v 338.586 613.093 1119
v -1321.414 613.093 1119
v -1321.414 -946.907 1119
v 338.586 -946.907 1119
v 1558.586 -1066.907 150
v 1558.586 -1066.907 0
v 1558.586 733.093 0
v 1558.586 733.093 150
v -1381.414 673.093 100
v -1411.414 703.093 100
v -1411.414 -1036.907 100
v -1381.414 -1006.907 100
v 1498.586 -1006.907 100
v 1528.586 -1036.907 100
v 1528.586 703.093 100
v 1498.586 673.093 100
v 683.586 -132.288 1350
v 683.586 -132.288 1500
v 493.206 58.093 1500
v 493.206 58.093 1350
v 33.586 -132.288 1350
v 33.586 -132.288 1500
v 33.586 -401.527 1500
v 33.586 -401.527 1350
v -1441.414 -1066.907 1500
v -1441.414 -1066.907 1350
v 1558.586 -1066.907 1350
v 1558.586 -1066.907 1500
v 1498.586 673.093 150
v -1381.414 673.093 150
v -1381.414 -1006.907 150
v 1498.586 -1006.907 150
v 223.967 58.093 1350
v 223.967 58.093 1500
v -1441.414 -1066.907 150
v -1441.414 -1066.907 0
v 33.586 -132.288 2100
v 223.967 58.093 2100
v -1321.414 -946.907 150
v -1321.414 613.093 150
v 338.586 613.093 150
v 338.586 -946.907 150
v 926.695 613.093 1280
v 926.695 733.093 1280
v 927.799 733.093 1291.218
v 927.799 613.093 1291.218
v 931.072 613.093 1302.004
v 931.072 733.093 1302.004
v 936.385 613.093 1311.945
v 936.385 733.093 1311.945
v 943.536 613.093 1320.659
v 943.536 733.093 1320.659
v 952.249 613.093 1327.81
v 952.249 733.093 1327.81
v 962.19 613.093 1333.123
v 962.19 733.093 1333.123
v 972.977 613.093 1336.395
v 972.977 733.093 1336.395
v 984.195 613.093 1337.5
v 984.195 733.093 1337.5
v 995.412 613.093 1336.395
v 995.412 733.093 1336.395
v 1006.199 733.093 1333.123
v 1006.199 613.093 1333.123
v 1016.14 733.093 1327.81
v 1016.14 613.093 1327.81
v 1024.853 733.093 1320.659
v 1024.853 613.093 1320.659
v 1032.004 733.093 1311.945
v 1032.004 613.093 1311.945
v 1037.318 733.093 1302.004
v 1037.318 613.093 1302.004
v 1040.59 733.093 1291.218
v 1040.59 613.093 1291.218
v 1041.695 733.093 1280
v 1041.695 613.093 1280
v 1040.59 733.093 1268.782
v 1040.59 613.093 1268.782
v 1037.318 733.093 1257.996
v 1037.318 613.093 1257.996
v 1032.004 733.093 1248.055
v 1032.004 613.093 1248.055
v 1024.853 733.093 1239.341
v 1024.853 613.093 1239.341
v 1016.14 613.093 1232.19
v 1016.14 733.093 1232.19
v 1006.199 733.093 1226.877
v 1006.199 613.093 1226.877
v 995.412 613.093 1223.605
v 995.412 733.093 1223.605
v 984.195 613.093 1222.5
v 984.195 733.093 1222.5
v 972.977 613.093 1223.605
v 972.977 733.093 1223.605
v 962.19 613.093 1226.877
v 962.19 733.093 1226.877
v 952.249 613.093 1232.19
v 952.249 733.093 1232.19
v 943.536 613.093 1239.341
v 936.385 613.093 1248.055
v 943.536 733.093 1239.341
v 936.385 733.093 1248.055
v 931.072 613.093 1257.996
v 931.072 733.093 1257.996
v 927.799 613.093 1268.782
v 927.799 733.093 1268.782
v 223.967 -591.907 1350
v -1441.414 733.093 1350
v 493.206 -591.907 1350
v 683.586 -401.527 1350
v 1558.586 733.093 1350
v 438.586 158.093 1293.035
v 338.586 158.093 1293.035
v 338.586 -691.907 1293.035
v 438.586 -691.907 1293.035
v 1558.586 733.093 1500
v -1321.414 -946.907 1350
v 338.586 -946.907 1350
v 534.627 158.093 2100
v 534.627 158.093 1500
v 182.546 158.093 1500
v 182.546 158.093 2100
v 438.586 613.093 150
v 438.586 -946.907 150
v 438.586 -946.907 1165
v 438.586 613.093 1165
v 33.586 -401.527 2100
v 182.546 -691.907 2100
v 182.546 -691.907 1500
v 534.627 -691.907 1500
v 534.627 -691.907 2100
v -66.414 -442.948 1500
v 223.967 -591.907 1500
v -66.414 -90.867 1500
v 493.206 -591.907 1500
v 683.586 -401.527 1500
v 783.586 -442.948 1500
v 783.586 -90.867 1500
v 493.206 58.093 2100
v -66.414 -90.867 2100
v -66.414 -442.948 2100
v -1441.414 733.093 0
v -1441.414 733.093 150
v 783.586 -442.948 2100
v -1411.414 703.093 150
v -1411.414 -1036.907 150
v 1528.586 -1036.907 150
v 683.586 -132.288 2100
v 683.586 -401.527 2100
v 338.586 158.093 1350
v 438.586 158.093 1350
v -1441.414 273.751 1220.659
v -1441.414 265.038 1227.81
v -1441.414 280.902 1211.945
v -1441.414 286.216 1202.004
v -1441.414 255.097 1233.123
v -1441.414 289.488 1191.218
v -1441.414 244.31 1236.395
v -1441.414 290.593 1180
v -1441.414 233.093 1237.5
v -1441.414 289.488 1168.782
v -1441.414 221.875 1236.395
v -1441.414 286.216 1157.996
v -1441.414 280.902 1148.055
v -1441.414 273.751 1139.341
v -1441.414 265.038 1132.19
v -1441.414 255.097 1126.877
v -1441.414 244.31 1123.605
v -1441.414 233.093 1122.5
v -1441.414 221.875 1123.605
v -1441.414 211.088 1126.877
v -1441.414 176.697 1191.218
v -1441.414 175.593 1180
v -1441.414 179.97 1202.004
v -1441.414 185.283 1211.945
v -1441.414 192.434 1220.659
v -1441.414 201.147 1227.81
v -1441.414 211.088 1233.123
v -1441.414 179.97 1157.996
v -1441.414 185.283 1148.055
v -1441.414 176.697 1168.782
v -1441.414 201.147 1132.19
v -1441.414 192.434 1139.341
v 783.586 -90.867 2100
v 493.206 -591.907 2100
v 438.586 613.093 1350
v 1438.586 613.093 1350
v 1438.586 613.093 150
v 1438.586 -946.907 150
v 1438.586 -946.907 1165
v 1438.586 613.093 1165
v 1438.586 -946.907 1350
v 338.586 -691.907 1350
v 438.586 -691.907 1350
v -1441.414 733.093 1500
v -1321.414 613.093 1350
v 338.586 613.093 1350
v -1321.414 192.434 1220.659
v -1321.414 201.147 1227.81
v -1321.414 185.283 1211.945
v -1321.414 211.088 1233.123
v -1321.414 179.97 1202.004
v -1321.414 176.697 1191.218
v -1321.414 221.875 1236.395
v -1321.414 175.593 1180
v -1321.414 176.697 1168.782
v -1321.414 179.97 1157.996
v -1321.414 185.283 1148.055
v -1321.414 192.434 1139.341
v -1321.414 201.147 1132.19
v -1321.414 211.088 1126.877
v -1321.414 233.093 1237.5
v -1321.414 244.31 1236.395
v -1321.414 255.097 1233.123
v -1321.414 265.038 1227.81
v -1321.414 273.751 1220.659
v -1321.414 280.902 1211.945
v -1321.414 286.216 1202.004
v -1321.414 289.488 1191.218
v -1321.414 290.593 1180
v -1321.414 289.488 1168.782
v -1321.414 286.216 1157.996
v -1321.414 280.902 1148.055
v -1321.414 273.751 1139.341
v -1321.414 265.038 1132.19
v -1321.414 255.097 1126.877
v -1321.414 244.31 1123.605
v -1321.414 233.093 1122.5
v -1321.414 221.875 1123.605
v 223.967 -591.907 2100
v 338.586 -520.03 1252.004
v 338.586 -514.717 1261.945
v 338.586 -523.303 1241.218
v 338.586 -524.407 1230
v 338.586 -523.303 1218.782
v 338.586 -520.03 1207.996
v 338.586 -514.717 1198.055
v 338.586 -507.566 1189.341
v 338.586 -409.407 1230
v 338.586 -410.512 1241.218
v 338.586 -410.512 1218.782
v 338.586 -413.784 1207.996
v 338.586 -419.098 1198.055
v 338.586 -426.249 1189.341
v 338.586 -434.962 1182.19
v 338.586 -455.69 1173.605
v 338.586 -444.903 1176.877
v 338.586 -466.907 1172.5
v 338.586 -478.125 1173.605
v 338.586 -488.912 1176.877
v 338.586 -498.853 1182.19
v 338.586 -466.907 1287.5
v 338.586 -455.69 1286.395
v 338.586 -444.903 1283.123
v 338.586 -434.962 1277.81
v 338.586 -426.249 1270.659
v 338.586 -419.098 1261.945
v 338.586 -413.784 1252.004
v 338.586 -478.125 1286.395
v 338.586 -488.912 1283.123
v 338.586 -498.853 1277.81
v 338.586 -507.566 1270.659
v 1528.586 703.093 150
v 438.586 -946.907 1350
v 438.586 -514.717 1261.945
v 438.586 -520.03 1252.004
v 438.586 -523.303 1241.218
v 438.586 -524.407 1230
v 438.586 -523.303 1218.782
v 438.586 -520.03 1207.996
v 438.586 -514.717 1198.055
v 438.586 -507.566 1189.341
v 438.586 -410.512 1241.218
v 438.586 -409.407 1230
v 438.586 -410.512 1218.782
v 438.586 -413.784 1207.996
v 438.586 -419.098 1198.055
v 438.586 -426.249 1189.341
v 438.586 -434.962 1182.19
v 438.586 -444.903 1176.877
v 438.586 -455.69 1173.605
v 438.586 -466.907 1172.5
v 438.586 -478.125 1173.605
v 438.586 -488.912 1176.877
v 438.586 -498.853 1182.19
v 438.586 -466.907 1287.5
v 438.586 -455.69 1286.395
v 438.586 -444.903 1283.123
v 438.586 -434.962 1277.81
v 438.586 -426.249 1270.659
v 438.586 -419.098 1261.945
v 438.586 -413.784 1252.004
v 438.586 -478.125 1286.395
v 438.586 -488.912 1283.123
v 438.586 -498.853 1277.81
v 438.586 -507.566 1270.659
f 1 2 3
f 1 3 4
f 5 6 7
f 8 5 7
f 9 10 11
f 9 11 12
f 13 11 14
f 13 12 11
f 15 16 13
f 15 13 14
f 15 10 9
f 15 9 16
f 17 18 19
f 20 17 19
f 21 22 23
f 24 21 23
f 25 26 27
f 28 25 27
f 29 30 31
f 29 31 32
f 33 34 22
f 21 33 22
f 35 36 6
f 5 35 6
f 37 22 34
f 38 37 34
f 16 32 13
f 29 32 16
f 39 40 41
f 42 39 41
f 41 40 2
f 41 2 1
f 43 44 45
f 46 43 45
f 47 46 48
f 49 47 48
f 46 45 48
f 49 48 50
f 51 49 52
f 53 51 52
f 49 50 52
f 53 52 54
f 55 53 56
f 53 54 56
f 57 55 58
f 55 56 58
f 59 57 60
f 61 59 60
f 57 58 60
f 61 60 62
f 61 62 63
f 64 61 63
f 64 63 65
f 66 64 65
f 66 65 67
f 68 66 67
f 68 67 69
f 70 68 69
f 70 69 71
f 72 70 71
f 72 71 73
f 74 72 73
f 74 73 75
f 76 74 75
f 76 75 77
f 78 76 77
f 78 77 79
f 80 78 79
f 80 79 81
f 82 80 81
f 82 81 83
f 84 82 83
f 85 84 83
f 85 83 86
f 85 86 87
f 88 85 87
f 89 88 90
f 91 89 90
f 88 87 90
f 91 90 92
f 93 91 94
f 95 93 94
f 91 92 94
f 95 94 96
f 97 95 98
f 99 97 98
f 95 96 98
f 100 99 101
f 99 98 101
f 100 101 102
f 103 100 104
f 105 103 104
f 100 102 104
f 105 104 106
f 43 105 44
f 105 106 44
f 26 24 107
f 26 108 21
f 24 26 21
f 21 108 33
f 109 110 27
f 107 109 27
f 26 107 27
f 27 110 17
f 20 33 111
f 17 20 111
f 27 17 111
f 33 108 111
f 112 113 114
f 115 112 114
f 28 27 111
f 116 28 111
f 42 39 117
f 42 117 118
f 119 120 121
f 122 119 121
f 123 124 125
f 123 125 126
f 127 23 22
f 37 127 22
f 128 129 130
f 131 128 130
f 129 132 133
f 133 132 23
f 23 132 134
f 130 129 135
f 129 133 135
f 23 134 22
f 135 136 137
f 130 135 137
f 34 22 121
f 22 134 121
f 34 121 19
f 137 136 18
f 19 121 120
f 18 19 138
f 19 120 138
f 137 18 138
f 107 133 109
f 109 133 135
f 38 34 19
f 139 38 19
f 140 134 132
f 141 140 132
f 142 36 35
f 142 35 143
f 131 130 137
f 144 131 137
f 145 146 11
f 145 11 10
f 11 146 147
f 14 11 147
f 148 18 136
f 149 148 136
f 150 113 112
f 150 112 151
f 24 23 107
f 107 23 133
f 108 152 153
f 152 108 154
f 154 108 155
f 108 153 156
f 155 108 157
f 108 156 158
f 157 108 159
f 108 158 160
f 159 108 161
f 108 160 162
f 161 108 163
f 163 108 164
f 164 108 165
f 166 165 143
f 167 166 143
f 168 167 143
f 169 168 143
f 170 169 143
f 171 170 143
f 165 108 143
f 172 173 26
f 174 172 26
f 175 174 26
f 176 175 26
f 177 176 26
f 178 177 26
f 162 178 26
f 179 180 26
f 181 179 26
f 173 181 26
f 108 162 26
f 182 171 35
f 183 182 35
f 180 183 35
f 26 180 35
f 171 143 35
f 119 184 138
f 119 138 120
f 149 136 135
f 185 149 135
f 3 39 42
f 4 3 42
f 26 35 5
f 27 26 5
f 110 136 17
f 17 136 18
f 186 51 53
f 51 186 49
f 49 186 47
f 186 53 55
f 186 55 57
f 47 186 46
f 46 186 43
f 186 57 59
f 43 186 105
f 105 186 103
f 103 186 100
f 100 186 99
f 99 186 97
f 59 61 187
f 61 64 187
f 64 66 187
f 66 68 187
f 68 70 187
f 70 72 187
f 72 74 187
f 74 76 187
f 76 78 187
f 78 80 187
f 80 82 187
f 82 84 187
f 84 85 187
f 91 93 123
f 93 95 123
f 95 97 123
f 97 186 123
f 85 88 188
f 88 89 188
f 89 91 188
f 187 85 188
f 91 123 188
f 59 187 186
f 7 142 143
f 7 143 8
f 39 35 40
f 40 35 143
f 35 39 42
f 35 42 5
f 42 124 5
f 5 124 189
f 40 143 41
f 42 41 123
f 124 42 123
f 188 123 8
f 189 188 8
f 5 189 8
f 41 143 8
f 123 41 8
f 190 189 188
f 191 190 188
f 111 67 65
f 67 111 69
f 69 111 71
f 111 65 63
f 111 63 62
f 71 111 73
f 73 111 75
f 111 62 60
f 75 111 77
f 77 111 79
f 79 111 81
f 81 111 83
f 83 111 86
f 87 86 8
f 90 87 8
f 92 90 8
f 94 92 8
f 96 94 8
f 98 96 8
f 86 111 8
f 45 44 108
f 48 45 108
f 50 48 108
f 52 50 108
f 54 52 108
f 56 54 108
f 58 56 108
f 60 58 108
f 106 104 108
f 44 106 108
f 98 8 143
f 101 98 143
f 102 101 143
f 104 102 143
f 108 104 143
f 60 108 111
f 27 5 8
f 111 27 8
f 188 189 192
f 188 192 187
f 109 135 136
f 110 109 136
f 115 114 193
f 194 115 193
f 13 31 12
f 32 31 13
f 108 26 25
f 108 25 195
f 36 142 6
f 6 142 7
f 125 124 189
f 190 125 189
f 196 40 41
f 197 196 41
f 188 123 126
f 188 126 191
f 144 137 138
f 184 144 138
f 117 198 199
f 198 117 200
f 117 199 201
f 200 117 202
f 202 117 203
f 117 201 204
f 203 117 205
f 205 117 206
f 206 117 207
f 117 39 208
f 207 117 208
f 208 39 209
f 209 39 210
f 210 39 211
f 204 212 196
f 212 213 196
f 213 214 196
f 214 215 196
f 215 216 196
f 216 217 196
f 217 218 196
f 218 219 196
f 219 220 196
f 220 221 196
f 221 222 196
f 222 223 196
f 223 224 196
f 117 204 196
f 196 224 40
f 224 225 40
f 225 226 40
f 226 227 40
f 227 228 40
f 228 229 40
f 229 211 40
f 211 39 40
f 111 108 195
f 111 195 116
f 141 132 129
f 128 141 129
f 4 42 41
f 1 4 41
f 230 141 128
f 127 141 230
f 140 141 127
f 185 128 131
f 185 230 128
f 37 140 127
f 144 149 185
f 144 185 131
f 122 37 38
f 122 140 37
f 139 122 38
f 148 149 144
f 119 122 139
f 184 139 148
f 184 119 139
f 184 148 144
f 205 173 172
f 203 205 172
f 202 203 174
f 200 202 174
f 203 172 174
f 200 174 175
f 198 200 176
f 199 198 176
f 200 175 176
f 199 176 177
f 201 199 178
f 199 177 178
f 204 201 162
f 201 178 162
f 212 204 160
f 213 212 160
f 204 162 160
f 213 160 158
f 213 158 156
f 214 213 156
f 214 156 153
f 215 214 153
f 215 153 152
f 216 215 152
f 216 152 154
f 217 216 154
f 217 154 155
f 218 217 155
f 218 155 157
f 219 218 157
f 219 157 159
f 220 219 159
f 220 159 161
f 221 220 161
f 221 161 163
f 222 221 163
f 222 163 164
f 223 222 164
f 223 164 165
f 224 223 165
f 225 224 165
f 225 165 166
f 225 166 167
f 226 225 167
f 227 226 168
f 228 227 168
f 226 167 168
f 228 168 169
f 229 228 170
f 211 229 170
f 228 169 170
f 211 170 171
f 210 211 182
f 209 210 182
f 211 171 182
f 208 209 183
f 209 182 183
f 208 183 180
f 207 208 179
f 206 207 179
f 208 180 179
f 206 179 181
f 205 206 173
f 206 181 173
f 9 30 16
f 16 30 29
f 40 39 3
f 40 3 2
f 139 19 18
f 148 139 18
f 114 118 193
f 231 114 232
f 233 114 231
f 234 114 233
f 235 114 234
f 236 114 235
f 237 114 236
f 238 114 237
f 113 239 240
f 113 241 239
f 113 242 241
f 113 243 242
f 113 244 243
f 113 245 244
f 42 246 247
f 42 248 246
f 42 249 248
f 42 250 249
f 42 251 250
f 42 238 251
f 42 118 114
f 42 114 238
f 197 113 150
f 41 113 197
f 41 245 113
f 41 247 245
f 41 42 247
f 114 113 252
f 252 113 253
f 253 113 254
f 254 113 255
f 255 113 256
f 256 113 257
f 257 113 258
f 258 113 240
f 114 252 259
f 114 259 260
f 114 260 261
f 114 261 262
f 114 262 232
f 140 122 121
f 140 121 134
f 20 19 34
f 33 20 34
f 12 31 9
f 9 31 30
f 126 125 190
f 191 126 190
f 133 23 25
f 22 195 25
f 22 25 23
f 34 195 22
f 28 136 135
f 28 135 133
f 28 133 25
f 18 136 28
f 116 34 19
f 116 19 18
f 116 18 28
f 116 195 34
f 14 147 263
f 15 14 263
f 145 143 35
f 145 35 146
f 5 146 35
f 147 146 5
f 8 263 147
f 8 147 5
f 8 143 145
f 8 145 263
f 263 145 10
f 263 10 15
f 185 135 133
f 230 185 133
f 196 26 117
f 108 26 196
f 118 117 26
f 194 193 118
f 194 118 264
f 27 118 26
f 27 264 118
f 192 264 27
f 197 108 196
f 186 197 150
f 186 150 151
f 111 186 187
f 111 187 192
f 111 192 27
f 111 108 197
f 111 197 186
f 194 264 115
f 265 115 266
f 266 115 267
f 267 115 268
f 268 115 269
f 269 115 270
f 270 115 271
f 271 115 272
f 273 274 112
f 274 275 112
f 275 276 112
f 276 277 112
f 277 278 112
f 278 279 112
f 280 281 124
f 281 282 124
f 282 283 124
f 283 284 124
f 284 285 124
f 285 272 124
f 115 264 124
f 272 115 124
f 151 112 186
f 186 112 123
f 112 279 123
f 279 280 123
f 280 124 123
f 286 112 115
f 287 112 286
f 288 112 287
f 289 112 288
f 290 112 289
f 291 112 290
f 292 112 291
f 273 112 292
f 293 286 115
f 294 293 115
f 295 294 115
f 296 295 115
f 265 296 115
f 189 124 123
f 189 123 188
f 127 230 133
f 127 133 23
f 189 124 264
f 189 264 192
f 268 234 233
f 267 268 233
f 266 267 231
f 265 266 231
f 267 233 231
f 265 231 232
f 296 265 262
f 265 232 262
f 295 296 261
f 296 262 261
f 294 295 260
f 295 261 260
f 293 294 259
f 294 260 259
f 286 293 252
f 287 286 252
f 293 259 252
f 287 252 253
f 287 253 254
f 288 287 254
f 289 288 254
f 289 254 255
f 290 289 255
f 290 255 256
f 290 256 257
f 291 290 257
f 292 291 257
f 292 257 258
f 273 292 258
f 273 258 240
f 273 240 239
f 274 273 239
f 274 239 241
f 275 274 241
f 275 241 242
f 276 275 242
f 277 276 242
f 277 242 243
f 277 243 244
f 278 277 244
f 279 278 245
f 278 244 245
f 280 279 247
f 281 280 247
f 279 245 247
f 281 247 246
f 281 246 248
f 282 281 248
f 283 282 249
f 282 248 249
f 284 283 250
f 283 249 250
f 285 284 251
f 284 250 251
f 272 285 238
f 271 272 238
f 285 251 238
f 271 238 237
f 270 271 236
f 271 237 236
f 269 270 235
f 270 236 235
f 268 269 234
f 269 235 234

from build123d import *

# Parameters (mm, degrees)
F0_W      = 3000
F0_H      = 1800
F1_DEPTH  = 150
F2_W      = 2940
F2_H      = 1740
F2_W_2    = 2880
F2_H_2    = 1680
F3_DEPTH  = 50
F4_W      = 1660
F4_H      = 1560
F4_W_2    = 1000
F5_DEPTH  = 1200
F6_W      = 3000
F6_H      = 1800
F7_DEPTH  = 150
F8_R      = 57.5
F9_DEPTH  = 390
F10_R     = 57.5
F11_DEPTH = 430
F12_R     = 57.5
F13_DEPTH = 660
F15_DEPTH = 150
F16_DEPTH = 600
F17_W     = 850
F17_H     = 56.9647312164
F18_DEPTH = 100
F20_W     = 1000
F20_H     = 1560
F21_DEPTH = 1015
F19_W     = 1660
F19_H     = 1560
F22_DEPTH = 969


with BuildPart() as f1:
    # F0 (on Top) → F1 (new body)
    with BuildSketch(Plane.XY):
        with Locations((58.586359024, -166.9074058533)):
            Rectangle(F0_W, F0_H)
    extrude(amount=F1_DEPTH)

    # F2 (on face) → F3 (cut)
    with BuildSketch(Plane.XY.offset(150)):
        with Locations((58.586359024, -166.9074058533)):
            Rectangle(F2_W, F2_H)
        with Locations((58.586359024, -166.9074058533)):
            Rectangle(F2_W_2, F2_H_2, mode=Mode.SUBTRACT)
    extrude(amount=-F3_DEPTH, mode=Mode.SUBTRACT)


with BuildPart() as f5:
    # F4 (on face) → F5 (new body)
    with BuildSketch(Plane.XY.offset(150)):
        Polygon((1558.586359024, -1066.9074058533), (1558.586359024, 733.0925941467), (-1441.413640976, 733.0925941467), (-1441.413640976, -1066.9074058533), (338.586359024, -1066.9074058533), align=None)
        with Locations((-491.413640976, -166.9074058533)):
            Rectangle(F4_W, F4_H, mode=Mode.SUBTRACT)
        with Locations((938.586359024, -166.9074058533)):
            Rectangle(F4_W_2, F4_H, mode=Mode.SUBTRACT)
    extrude(amount=F5_DEPTH)

    # F8 (on face) → F9 (cut)
    with BuildSketch(Plane(origin=(0, 733.0925941467, 0), x_dir=(-1, 0, 0), z_dir=(0, 1, 0))):
        with Locations((-984.1946363449, 1280)):
            Circle(F8_R)
    extrude(amount=-F9_DEPTH, mode=Mode.SUBTRACT)

    # F10 (on face) → F11 (cut)
    with BuildSketch(Plane(origin=(338.586359024, 0, 0), x_dir=(0, -1, 0), z_dir=(-1, 0, 0))):
        with Locations((466.9074058533, 1230)):
            Circle(F10_R)
    extrude(amount=-F11_DEPTH, mode=Mode.SUBTRACT)

    # F12 (on face) → F13 (cut)
    with BuildSketch(Plane(origin=(-1441.413640976, 0, 0), x_dir=(0, -1, 0), z_dir=(-1, 0, 0))):
        with Locations((-233.0925941467, 1180)):
            Circle(F12_R)
    extrude(amount=-F13_DEPTH, mode=Mode.SUBTRACT)

    # F17 (on face) → F18 (cut, through all)
    with BuildSketch(Plane(origin=(338.586359024, 0, 0), x_dir=(0, -1, 0), z_dir=(-1, 0, 0))):
        with Locations((266.9074058533, 1321.5176343918)):
            Rectangle(F17_W, F17_H)
    extrude(amount=-F18_DEPTH, mode=Mode.SUBTRACT)


with BuildPart() as f7:
    # F6 (on face) → F7 (new body)
    with BuildSketch(Plane.XY.offset(1350)):
        with Locations((58.586359024, -166.9074058533)):
            Rectangle(F6_W, F6_H)
    extrude(amount=F7_DEPTH)

    # F14 (on face) → F15 (cut, through all)
    with BuildSketch(Plane.XY.offset(1500)):
        Polygon((33.586359024, -132.287998082), (33.586359024, -401.5268136245), (223.9669512528, -591.9074058533), (493.2057667953, -591.9074058533), (683.586359024, -401.5268136245), (683.586359024, -132.287998082), (493.2057667953, 58.0925941467), (223.9669512528, 58.0925941467), align=None)
    extrude(amount=-F15_DEPTH, mode=Mode.SUBTRACT)


with BuildPart() as f16:
    # F14 (on face) → F16 (new body)
    with BuildSketch(Plane.XY.offset(1500)):
        Polygon((182.5455950155, 158.0925941467), (-66.413640976, -90.8666418447), (-66.413640976, -442.9481698618), (182.5455950155, -691.9074058533), (534.6271230326, -691.9074058533), (783.586359024, -442.9481698618), (783.586359024, -90.8666418447), (534.6271230326, 158.0925941467), align=None)
        Polygon((223.9669512528, -591.9074058533), (33.586359024, -401.5268136245), (33.586359024, -132.287998082), (223.9669512528, 58.0925941467), (493.2057667953, 58.0925941467), (683.586359024, -132.287998082), (683.586359024, -401.5268136245), (493.2057667953, -591.9074058533), align=None, mode=Mode.SUBTRACT)
    extrude(amount=F16_DEPTH)


with BuildPart() as f21:
    # F20 (on face) → F21 (new body)
    with BuildSketch(Plane.XY.offset(150)):
        with Locations((938.586359024, -166.9074058533)):
            Rectangle(F20_W, F20_H)
    extrude(amount=F21_DEPTH)


with BuildPart() as f22:
    # F19 (on face) → F22 (new body)
    with BuildSketch(Plane.XY.offset(150)):
        with Locations((-491.413640976, -166.9074058533)):
            Rectangle(F19_W, F19_H)
    extrude(amount=F22_DEPTH)


solid = Compound([f1.part, f5.part, f7.part, f16.part, f21.part, f22.part])
